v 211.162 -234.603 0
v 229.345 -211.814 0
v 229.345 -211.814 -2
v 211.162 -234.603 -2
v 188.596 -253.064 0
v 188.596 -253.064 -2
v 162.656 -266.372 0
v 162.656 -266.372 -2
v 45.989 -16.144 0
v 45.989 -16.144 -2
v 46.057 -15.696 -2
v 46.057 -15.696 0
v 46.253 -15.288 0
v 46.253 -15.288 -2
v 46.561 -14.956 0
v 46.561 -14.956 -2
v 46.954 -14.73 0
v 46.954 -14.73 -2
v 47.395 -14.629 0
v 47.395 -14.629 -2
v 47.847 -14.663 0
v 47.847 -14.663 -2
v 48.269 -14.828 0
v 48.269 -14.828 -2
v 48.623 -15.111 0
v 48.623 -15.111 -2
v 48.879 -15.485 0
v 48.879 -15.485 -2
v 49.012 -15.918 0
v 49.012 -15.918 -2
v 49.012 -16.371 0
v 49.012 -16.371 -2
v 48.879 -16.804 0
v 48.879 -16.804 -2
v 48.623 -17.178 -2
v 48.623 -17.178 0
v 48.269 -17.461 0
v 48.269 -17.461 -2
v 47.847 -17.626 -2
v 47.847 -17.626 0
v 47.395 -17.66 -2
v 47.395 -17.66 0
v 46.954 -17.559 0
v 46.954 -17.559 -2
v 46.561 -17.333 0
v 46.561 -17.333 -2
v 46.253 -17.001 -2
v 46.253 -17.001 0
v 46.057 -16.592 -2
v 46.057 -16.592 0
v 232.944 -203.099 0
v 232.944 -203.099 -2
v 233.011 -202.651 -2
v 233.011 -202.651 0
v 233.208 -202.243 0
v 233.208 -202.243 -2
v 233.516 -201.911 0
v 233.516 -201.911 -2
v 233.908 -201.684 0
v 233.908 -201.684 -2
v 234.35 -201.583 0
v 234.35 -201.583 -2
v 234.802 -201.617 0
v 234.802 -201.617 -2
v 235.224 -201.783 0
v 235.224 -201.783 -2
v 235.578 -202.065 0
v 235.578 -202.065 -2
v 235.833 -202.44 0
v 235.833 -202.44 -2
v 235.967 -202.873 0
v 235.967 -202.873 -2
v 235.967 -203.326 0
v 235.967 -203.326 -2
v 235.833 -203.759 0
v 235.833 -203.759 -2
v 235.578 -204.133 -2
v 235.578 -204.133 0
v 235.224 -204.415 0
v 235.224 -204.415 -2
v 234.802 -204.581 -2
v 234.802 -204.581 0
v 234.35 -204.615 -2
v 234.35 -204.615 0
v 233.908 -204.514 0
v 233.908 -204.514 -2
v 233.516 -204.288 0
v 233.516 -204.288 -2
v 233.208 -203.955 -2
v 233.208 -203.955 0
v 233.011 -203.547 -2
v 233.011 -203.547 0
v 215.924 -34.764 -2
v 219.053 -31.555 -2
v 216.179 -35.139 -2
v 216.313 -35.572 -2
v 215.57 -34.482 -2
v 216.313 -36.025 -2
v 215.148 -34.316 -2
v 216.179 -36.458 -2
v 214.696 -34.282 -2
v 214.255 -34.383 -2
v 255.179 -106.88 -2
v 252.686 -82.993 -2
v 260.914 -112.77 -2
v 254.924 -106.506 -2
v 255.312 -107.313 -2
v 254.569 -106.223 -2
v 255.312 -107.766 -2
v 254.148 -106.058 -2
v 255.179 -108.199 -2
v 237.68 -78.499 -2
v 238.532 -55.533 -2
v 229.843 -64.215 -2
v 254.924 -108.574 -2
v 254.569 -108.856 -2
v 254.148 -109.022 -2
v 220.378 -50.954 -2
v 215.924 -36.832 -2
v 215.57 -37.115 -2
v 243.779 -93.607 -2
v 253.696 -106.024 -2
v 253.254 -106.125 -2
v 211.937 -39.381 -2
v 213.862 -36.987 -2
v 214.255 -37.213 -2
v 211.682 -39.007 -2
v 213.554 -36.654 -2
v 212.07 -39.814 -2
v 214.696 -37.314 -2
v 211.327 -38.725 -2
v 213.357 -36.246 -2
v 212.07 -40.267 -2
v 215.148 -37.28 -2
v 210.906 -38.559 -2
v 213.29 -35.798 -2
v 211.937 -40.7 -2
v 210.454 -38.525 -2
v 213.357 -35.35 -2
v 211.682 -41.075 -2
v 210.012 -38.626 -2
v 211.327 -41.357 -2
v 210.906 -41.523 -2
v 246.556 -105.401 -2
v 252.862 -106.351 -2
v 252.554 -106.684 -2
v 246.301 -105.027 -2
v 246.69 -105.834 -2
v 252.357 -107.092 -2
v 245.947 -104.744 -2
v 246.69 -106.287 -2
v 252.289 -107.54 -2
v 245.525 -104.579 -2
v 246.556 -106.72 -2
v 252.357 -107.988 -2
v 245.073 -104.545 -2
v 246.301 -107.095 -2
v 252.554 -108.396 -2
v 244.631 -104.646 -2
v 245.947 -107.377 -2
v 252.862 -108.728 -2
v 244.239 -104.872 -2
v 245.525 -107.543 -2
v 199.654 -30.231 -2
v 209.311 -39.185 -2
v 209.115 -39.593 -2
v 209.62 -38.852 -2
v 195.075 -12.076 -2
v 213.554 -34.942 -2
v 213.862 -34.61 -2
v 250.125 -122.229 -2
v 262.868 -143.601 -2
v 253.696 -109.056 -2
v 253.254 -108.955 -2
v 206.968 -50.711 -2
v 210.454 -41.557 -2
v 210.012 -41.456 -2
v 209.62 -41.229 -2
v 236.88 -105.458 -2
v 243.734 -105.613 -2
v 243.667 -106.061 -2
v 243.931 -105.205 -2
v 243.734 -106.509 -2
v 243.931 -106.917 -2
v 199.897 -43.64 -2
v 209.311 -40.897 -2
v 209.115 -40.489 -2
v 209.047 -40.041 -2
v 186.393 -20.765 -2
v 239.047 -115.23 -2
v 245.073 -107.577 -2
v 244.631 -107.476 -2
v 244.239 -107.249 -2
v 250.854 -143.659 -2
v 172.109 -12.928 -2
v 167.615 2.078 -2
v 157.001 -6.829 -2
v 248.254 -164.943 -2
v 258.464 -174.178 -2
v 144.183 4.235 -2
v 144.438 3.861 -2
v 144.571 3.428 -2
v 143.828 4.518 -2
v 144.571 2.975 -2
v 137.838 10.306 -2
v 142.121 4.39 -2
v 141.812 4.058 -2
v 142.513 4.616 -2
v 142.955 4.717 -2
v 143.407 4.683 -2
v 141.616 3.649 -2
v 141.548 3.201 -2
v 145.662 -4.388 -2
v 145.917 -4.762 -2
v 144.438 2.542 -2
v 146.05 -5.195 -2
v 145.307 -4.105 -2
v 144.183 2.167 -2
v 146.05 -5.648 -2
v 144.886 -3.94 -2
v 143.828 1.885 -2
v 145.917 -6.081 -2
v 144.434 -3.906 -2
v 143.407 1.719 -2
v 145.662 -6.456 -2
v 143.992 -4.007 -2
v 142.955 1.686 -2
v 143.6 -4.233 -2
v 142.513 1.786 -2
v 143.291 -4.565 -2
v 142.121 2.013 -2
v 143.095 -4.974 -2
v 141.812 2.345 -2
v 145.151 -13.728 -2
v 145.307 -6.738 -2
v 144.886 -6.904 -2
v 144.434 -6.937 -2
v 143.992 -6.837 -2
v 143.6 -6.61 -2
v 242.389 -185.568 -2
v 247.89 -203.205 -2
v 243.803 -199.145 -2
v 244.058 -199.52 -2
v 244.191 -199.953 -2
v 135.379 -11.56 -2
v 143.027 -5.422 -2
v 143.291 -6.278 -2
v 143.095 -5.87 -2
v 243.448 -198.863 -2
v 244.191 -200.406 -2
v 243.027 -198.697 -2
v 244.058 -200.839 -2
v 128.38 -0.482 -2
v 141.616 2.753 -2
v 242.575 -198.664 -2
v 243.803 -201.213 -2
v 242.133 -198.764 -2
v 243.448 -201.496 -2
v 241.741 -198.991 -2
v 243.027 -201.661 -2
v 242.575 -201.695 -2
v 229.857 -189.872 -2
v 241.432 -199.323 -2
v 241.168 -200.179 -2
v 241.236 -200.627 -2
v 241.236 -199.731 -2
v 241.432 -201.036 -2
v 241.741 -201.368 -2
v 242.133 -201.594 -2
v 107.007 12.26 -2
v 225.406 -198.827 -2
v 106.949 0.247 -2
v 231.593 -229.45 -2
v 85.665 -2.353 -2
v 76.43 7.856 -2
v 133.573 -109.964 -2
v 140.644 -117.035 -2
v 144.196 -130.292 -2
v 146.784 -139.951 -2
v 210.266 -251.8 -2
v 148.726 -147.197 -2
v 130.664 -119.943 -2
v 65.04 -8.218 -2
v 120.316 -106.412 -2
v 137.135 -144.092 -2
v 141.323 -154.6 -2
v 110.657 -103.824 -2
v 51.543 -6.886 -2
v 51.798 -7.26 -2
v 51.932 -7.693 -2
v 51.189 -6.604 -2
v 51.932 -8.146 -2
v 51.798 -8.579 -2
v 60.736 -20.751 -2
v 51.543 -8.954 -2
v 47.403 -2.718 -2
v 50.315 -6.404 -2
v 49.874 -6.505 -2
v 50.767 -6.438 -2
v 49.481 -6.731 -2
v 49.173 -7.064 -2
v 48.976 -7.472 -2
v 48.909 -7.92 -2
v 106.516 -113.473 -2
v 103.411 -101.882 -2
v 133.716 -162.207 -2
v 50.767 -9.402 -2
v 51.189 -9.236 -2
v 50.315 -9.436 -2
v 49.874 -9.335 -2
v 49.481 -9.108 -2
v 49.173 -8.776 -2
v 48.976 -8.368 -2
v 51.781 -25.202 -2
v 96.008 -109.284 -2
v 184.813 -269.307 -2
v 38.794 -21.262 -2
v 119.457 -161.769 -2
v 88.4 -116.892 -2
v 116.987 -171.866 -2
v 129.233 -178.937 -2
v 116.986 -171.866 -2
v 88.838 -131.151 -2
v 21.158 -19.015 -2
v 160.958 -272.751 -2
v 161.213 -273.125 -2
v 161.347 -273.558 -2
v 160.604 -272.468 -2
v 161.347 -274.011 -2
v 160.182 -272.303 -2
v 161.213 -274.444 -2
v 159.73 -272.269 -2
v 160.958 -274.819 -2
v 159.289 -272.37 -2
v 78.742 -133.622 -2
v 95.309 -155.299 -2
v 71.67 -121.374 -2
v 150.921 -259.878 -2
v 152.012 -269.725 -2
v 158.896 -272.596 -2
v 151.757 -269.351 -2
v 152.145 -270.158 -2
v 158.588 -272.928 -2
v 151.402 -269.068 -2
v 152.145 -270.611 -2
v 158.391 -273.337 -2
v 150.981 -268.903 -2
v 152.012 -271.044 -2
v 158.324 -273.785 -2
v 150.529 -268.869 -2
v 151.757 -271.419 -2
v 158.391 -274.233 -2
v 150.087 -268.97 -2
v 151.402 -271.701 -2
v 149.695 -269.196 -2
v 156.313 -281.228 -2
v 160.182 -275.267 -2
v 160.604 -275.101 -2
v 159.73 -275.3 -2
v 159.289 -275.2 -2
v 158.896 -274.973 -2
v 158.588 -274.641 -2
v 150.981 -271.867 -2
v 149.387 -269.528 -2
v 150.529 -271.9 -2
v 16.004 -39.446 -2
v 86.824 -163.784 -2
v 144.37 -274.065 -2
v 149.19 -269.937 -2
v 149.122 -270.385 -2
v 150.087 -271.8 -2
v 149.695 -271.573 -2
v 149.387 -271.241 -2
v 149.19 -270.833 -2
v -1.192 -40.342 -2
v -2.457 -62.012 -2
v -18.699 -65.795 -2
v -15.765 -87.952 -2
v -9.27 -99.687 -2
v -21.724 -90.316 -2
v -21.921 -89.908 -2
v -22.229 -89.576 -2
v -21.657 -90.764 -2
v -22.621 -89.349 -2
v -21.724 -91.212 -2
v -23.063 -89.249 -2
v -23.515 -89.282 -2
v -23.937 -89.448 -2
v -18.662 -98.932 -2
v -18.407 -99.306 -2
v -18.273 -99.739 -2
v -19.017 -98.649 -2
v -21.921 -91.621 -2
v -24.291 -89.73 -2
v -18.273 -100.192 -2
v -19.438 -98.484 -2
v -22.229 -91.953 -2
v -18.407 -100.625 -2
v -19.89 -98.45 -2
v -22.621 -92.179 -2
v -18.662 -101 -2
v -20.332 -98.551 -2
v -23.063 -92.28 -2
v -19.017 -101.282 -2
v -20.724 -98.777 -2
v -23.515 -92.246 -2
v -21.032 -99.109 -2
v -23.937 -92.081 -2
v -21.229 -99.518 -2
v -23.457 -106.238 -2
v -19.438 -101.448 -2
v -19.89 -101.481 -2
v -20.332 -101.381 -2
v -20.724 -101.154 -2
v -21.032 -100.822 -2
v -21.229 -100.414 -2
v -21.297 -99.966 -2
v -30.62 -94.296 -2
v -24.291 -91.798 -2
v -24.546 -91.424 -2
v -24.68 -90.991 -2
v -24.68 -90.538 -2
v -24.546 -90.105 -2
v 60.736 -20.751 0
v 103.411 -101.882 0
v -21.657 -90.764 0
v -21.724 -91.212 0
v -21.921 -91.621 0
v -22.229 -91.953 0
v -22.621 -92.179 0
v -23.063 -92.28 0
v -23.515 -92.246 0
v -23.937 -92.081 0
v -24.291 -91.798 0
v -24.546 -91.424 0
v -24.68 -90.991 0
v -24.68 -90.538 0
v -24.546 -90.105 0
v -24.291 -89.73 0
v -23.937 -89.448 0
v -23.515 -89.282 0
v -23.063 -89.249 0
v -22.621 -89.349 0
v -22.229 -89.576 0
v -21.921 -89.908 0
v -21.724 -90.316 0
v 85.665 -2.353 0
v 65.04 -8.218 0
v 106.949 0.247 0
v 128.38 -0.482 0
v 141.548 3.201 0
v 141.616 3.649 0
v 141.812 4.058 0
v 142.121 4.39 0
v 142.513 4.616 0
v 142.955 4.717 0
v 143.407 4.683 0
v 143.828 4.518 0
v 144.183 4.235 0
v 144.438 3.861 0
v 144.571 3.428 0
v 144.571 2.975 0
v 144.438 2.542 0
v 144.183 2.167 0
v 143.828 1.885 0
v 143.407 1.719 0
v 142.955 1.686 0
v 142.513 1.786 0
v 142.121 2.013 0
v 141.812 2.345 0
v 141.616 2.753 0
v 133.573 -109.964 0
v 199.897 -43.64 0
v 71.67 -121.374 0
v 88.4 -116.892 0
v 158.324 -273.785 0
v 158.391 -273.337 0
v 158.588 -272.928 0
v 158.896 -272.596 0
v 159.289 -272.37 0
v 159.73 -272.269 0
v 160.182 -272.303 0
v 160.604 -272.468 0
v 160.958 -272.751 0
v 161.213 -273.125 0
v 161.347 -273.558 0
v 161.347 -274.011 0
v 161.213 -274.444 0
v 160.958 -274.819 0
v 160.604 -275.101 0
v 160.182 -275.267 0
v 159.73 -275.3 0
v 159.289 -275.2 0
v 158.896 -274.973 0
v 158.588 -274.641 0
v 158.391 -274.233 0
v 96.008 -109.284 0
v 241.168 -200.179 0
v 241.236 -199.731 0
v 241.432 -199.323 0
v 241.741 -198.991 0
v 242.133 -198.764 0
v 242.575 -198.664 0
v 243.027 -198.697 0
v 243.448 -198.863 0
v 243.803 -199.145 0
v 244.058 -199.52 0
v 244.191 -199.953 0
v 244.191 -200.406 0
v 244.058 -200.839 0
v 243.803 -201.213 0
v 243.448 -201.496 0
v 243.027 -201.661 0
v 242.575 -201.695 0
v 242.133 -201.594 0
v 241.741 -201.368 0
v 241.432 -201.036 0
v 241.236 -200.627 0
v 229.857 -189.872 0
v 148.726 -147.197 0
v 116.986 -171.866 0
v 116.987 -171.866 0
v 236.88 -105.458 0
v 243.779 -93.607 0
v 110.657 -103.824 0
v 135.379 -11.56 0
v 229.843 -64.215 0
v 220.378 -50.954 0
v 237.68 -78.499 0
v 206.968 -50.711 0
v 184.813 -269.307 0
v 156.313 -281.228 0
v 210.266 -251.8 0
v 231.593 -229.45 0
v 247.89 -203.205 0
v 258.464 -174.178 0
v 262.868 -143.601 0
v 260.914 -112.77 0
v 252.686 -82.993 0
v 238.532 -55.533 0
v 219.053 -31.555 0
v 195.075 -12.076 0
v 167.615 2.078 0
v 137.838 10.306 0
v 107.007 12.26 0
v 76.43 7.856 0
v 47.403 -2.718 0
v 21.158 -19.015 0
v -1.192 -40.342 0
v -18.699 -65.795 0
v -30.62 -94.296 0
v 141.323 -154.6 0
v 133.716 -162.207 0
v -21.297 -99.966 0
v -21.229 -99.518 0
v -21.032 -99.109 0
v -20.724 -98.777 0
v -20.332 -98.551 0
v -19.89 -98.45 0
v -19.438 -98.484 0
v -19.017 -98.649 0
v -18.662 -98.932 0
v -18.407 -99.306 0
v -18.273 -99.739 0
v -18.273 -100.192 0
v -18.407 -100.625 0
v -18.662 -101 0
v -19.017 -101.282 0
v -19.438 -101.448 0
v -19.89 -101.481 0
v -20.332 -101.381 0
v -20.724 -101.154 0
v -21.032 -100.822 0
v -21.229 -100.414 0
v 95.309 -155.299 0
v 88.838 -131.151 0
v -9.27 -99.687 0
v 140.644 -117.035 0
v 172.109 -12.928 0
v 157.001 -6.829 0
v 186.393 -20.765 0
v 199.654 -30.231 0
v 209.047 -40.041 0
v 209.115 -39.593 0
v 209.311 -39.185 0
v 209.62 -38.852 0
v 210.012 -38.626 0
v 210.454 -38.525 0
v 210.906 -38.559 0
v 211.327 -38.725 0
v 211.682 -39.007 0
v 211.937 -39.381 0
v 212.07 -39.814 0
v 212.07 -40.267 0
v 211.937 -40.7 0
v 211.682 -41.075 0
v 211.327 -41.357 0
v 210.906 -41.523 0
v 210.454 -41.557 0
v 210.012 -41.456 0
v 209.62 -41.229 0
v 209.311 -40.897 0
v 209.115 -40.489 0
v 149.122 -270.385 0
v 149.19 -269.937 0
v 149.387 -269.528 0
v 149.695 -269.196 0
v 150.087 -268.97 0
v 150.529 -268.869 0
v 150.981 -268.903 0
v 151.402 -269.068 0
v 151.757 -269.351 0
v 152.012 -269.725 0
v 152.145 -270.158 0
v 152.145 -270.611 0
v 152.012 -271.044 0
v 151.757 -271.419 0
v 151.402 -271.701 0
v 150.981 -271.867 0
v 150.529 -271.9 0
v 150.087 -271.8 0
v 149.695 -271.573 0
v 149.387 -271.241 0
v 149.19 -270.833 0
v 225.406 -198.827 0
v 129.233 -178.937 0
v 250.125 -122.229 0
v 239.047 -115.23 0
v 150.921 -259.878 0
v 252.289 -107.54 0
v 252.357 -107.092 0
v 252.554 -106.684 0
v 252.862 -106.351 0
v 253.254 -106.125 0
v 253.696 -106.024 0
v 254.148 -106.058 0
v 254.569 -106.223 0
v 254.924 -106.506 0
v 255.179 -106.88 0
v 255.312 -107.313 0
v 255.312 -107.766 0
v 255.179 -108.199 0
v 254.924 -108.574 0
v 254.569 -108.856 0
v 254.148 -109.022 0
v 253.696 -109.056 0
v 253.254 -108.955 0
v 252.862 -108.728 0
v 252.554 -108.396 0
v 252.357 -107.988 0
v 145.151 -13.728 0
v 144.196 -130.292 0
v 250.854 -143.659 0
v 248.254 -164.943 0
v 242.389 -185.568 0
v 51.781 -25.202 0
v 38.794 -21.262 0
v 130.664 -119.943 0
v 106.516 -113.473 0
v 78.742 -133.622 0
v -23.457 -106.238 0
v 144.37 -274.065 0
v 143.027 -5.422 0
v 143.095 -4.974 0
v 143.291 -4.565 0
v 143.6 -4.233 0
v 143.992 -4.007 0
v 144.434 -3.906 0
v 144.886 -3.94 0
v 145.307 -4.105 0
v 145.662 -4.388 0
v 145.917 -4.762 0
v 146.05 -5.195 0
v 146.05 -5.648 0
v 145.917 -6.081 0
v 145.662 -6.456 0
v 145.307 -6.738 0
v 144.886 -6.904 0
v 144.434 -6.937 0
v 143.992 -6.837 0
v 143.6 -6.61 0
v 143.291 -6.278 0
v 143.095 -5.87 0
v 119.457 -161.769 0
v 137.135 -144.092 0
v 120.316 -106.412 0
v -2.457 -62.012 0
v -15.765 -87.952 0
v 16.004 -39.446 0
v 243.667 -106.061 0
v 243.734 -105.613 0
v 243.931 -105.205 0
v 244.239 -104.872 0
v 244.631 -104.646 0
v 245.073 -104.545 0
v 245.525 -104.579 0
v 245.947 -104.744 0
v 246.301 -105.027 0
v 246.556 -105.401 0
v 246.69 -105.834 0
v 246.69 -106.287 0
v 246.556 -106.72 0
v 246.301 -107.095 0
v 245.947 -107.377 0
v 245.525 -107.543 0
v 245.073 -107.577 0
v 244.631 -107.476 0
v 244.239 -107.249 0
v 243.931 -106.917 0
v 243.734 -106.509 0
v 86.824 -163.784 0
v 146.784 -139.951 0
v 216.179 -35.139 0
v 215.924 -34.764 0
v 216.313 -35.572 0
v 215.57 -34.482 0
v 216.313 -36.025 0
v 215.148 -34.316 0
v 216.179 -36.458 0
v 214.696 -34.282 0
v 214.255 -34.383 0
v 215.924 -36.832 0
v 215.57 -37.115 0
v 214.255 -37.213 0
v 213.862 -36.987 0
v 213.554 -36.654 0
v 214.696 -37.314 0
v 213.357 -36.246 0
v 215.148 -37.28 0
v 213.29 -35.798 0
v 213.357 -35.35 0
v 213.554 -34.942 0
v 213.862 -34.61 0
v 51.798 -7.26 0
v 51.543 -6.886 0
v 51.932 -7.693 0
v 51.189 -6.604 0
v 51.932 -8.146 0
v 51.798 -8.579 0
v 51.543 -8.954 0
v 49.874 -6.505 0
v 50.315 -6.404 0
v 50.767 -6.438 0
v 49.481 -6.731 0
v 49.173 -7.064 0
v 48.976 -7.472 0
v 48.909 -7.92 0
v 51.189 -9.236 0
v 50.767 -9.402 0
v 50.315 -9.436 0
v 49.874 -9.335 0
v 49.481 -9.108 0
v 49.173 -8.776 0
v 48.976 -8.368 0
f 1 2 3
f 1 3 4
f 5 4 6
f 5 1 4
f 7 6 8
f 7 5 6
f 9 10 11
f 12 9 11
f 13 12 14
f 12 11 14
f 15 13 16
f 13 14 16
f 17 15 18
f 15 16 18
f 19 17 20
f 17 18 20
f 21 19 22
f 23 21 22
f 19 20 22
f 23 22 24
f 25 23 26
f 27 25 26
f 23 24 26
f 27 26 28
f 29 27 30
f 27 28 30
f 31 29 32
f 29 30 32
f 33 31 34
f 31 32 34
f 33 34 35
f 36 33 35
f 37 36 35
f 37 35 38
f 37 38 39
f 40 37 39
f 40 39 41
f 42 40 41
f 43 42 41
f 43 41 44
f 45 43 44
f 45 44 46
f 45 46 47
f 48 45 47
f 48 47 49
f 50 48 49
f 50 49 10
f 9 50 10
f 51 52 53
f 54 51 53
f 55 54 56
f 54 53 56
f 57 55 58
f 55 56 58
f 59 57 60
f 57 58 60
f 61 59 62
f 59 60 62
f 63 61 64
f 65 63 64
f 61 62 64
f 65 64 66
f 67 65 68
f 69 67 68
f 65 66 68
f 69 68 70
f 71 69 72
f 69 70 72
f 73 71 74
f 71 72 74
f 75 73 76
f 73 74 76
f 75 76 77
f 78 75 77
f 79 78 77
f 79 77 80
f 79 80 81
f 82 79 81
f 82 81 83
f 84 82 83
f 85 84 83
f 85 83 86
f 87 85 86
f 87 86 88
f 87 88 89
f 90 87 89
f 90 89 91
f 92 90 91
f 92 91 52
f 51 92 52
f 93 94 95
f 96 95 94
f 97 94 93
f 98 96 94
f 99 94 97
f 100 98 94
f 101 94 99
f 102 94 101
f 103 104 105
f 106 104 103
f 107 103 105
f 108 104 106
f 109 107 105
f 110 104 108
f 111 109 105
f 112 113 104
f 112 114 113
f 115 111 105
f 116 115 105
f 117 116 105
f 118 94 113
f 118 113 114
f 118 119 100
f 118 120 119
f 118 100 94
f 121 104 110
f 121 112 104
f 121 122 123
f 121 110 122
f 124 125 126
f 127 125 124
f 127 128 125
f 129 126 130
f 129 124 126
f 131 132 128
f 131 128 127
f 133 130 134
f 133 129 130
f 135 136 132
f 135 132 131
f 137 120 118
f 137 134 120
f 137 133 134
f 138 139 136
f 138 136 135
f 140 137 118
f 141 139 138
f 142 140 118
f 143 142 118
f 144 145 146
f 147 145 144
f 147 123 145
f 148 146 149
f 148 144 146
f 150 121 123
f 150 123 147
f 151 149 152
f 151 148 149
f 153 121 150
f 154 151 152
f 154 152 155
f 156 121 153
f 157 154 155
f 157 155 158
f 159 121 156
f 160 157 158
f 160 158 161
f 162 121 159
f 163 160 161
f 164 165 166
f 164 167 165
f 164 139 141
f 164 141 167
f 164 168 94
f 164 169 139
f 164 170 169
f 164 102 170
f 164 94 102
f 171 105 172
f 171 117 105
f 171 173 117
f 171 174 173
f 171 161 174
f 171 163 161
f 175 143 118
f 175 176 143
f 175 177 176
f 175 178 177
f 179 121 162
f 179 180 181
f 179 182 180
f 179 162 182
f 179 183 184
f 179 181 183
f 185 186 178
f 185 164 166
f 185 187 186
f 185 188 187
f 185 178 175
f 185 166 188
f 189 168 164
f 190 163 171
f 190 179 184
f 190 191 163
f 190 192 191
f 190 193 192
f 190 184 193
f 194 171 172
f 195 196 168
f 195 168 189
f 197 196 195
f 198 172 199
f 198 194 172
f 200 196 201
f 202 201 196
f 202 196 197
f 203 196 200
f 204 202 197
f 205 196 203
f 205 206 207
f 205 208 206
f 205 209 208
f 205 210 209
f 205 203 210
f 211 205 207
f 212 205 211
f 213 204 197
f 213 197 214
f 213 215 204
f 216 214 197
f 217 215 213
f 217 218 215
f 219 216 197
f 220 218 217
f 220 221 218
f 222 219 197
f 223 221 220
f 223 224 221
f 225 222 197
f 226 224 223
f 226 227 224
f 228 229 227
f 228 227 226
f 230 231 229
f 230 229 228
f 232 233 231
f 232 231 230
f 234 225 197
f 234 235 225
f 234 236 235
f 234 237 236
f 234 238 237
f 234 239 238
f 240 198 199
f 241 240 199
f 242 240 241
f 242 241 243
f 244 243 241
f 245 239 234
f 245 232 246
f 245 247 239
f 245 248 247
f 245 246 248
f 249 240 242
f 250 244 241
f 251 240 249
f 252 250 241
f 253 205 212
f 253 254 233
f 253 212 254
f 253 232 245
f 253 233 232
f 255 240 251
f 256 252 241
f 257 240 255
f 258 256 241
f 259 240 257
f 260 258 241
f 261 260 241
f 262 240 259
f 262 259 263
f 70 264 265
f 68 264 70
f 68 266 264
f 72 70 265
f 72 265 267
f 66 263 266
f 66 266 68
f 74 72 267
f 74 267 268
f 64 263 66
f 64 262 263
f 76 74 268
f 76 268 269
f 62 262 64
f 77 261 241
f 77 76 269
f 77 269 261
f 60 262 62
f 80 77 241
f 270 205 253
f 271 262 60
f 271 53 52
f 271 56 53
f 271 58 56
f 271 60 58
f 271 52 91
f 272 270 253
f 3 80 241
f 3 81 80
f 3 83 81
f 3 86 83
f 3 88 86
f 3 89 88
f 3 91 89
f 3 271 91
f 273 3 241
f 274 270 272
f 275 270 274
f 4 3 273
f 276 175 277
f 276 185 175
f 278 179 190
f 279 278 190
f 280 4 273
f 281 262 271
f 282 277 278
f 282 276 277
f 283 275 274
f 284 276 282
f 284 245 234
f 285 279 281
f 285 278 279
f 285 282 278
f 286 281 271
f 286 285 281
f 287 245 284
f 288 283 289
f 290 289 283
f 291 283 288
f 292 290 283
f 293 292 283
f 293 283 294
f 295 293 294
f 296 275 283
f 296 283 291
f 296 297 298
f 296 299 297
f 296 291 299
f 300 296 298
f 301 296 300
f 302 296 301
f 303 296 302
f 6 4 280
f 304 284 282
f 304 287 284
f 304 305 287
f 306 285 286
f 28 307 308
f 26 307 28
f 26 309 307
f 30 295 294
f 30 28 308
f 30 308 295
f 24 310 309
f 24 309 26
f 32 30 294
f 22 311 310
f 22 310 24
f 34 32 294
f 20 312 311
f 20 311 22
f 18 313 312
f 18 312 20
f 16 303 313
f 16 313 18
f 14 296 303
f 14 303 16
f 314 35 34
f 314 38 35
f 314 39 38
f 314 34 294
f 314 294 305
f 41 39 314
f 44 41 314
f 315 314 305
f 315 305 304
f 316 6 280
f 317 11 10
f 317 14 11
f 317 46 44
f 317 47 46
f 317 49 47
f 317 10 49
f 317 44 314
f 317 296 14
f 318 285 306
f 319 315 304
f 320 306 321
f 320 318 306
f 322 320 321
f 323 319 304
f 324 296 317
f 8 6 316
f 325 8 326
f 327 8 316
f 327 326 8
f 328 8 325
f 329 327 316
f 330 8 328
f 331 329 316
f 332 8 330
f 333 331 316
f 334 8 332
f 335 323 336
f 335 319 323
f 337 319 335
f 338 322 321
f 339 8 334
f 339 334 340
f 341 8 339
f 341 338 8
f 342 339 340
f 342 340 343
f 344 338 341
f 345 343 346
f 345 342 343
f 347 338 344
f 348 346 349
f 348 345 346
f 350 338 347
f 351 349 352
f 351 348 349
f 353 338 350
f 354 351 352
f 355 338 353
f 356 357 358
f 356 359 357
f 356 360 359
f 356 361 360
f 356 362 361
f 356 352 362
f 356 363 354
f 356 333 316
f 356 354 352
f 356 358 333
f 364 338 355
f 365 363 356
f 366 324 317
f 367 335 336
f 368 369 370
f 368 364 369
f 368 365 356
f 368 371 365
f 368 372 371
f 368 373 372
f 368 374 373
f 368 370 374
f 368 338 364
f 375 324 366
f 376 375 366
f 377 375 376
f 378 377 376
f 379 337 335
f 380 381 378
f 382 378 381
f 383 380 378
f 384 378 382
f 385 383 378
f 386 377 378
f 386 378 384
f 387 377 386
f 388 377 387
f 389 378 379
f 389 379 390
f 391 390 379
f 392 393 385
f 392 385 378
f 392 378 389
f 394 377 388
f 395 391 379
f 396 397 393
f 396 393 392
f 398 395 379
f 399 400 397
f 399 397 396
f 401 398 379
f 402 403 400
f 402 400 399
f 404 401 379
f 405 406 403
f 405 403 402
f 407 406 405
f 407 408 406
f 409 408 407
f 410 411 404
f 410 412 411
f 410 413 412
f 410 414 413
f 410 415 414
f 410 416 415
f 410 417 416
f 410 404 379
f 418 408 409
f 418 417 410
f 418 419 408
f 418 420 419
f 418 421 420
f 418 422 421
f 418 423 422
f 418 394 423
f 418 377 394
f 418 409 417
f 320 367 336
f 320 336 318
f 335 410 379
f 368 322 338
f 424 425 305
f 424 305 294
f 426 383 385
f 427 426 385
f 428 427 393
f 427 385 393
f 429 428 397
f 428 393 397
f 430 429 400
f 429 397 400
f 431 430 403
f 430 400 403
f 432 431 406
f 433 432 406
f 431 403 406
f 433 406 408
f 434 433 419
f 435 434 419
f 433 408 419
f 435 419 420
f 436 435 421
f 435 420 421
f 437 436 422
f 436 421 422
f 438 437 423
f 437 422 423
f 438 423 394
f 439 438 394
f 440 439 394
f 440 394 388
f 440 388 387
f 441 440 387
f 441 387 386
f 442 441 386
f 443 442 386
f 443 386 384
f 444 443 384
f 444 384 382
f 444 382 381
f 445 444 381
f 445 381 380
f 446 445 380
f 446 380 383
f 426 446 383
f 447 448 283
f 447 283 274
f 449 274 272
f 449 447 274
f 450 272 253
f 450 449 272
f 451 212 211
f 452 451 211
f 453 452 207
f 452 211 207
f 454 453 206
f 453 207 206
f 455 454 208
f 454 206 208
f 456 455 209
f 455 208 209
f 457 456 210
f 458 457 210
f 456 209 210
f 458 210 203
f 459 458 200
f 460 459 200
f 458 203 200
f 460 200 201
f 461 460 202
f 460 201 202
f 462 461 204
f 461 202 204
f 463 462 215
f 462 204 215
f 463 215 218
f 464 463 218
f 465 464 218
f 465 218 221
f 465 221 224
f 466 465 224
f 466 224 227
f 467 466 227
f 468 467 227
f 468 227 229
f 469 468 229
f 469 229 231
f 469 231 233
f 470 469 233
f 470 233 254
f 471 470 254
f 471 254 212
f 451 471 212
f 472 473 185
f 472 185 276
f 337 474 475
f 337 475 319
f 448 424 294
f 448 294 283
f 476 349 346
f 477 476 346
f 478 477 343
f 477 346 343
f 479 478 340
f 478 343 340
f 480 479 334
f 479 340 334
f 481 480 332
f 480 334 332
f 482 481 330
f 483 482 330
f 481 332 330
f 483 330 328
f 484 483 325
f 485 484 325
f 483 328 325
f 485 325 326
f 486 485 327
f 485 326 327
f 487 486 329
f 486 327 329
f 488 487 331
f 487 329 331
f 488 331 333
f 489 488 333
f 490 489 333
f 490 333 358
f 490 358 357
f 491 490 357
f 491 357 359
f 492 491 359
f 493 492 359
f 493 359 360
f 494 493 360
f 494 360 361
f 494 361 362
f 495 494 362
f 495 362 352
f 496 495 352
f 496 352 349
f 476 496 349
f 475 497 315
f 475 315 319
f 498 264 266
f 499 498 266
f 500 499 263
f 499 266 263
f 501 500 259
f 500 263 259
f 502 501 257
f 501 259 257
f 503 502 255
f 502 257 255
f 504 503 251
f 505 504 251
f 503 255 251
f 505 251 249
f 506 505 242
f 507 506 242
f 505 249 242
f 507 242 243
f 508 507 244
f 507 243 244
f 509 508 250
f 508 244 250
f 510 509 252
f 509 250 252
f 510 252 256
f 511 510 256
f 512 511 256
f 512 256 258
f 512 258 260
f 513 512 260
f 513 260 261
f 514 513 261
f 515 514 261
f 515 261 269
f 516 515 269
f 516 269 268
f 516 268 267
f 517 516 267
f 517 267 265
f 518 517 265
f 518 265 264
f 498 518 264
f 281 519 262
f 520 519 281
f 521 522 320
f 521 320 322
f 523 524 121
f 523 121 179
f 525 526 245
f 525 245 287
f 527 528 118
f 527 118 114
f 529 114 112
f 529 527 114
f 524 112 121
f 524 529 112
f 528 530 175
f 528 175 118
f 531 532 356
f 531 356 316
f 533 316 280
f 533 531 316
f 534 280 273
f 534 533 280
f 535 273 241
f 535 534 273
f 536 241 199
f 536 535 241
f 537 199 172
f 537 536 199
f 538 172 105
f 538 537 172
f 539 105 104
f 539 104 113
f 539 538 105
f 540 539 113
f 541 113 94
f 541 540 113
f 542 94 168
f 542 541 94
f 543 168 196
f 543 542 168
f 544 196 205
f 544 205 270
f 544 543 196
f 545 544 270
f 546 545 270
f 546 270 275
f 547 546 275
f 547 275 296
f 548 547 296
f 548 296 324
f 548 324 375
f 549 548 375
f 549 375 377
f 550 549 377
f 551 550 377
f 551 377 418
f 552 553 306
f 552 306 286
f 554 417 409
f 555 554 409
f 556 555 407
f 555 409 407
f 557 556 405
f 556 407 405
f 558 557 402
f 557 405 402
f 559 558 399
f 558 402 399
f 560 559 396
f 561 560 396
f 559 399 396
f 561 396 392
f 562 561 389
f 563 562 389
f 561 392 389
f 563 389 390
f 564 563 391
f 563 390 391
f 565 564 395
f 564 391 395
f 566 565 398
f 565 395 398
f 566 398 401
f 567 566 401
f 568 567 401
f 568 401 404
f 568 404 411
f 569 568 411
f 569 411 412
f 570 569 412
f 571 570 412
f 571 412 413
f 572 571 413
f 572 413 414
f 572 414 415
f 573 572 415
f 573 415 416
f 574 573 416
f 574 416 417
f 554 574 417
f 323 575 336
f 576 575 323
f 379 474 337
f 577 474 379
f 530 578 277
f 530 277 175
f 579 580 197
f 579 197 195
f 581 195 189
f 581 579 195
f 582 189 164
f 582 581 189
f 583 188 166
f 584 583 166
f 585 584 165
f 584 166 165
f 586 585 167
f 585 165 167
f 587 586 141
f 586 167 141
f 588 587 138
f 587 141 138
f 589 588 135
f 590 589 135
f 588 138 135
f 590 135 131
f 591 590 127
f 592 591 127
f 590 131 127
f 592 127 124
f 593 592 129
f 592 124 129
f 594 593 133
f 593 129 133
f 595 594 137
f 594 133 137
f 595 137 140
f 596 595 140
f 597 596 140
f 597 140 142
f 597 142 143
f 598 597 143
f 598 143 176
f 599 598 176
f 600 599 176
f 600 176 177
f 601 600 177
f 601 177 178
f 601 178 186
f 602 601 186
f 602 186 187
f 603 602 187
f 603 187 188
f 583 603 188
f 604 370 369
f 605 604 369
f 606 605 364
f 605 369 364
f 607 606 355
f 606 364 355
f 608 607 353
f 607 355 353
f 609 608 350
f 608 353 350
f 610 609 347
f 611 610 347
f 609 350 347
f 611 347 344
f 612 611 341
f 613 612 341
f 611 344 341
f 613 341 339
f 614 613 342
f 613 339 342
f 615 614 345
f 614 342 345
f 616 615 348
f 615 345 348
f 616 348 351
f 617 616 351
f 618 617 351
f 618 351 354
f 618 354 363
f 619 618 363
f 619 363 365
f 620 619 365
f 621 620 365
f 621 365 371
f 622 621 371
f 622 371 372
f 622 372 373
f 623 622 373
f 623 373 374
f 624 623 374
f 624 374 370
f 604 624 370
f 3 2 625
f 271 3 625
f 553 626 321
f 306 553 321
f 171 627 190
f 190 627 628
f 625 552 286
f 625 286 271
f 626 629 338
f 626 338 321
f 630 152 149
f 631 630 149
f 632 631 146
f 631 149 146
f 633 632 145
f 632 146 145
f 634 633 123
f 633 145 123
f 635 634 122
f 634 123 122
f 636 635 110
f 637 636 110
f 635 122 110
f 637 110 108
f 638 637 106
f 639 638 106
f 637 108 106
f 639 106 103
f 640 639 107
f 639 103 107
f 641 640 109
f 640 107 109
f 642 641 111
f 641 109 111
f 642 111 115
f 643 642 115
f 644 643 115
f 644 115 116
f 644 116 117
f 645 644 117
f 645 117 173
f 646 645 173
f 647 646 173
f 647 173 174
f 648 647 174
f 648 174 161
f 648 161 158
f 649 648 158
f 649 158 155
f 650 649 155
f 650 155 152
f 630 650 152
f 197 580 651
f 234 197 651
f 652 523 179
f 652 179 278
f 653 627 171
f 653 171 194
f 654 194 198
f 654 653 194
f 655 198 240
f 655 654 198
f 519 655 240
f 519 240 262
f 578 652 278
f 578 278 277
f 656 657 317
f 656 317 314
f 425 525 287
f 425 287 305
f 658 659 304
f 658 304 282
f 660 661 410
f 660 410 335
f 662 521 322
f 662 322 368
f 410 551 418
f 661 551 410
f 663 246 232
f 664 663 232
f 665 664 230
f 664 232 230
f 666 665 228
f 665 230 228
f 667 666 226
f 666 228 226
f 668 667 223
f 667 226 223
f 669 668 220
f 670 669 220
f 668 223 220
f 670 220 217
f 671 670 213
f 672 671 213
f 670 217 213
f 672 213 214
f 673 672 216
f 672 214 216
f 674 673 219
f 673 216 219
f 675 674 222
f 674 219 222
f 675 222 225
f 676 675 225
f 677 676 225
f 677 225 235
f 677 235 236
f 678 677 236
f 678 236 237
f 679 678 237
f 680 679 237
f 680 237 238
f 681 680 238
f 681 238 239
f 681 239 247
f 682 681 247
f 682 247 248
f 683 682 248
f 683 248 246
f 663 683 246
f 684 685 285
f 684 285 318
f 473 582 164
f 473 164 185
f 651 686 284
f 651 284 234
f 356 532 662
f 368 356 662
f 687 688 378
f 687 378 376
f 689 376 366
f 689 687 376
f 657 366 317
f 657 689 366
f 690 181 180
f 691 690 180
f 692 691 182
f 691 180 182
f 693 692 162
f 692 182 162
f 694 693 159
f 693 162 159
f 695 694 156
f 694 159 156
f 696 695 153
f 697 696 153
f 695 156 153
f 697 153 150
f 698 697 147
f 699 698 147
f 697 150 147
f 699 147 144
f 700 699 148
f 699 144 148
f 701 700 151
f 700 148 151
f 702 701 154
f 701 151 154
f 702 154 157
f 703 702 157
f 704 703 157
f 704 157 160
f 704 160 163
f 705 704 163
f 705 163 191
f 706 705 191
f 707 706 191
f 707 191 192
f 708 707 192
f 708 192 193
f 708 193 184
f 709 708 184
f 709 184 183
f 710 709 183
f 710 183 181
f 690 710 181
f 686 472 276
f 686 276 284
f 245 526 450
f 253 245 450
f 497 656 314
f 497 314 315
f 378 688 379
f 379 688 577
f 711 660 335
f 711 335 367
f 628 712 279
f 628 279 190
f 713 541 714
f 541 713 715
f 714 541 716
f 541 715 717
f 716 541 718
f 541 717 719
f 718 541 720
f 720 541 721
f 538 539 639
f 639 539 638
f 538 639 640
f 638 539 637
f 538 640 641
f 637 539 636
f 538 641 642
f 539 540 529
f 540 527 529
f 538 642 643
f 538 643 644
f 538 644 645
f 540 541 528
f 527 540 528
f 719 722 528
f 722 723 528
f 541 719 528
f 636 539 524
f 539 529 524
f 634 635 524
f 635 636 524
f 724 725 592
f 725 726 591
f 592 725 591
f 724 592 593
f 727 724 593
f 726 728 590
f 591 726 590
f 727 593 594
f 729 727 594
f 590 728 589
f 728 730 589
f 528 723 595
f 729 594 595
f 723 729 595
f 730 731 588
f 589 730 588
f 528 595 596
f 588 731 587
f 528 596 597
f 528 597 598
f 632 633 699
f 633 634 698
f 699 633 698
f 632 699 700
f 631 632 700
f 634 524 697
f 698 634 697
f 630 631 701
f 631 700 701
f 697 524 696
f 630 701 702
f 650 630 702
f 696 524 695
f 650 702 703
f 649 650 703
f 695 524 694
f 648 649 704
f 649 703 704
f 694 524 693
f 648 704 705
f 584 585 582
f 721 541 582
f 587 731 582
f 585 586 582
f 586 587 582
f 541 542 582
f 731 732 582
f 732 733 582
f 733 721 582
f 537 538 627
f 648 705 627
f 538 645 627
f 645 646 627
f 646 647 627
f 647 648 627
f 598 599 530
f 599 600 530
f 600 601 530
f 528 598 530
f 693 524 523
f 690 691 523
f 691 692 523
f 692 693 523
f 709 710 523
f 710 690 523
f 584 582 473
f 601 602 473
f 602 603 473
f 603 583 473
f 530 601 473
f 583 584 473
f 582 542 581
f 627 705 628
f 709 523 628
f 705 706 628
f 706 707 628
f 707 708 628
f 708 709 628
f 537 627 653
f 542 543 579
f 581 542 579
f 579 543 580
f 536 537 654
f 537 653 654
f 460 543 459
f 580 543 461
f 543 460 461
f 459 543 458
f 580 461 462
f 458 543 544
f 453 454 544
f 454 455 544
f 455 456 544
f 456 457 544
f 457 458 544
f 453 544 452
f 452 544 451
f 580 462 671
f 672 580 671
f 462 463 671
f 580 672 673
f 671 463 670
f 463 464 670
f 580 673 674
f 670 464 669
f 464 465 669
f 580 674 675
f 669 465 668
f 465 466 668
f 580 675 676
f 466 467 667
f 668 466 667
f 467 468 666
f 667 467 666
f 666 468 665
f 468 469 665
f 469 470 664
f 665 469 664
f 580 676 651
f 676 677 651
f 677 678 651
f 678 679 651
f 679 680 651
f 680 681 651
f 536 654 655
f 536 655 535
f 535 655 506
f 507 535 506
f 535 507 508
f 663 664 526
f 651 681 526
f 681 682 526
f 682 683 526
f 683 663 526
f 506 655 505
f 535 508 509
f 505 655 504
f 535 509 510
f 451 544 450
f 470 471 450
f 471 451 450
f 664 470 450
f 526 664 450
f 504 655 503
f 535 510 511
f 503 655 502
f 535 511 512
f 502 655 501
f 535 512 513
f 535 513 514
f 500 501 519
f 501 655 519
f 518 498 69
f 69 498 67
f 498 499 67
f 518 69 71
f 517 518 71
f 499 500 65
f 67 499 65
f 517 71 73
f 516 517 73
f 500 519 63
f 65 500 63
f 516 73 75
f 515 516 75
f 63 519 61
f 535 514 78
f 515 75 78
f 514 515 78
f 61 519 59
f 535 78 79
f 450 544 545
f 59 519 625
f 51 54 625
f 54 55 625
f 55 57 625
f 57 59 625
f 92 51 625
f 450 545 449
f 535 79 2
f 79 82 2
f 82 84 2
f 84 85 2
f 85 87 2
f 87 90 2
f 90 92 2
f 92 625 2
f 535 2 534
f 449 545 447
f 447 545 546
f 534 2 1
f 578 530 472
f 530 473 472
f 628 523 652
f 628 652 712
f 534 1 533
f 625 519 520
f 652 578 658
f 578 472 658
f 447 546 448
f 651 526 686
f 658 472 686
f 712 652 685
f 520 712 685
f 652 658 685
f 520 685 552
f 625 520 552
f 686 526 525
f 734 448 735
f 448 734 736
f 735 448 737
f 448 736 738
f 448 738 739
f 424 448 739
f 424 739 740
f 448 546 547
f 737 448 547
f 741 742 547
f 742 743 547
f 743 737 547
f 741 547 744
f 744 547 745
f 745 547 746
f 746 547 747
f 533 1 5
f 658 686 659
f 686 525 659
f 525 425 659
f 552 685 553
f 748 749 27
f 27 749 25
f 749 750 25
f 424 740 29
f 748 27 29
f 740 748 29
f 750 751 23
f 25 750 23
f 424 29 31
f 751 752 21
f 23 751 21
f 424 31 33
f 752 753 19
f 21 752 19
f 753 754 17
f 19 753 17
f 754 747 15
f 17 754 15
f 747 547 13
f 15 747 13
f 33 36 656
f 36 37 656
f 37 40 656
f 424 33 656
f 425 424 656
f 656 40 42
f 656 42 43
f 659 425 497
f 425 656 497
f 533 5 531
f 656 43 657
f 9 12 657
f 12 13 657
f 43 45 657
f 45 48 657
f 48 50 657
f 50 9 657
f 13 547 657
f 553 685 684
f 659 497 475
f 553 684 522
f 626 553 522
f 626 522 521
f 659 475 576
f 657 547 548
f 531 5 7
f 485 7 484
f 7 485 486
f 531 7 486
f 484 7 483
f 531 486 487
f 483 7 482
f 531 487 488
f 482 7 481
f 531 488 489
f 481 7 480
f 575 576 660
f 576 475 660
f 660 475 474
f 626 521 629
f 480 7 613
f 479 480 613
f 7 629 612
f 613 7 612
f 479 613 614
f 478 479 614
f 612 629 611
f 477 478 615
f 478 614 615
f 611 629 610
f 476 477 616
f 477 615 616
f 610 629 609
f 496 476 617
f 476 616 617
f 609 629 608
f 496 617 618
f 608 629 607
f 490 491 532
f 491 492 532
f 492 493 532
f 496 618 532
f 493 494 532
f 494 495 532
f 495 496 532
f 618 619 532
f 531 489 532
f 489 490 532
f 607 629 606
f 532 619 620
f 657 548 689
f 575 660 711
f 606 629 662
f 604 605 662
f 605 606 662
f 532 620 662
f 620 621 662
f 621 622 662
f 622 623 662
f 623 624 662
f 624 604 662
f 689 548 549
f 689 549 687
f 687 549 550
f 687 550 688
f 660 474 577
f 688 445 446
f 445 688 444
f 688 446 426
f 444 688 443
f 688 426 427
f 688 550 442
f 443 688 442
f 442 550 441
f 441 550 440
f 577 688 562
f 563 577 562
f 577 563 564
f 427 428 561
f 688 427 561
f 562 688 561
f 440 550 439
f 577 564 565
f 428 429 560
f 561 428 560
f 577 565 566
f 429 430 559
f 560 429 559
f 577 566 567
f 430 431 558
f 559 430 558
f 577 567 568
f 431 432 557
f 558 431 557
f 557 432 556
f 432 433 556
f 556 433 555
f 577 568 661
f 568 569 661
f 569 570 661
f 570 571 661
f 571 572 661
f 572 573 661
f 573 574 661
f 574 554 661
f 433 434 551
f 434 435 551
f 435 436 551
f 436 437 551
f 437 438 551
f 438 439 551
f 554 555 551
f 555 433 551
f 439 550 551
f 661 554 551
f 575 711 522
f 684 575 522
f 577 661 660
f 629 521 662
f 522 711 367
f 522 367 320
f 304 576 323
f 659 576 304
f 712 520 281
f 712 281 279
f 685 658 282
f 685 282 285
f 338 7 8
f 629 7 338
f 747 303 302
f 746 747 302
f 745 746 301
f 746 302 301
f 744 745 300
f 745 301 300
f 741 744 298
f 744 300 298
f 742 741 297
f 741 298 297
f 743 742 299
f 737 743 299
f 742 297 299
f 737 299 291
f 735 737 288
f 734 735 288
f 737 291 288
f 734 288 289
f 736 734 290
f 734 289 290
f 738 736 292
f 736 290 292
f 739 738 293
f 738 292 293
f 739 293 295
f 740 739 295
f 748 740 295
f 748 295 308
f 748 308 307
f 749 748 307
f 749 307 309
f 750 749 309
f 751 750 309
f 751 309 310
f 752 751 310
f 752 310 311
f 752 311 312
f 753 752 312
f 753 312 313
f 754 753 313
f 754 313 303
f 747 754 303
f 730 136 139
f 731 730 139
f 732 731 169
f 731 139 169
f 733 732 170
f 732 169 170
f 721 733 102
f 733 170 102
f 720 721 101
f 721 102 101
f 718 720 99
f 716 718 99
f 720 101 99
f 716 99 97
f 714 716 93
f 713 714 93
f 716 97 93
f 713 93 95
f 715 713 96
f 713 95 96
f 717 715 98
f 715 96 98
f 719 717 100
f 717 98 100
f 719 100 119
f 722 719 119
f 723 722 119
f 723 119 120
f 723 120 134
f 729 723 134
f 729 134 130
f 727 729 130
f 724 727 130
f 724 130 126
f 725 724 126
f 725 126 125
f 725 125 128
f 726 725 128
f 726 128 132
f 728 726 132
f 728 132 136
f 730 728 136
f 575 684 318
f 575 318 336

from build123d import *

# Parameters (mm, degrees)
EXTRUDE_11_DEPTH    = 2
CHAMFER_1_SIZE      = 10
CHAMFER_3_SIZE      = 10
SKETCH_4_R          = 1.52
CUT_EXTRUDE_1_DEPTH = 10


with BuildPart() as part:
    # 草图2 → 凸台-拉伸11 (new body)
    with BuildSketch(Plane.XY):
        with BuildLine():
            Line((116.986968716, -171.866279839), (116.986166566, -171.866494817))
            Line((116.986166566, -171.866494817), (146.957834859, -283.724244016))
            ThreePointArc((146.95783486, -283.724244021), (219.052953151, -31.555197901), (-33.116092969, -103.650316192))
            Line((-33.116092963, -103.650316193), (78.741656236, -133.621984487))
            Line((78.741656247, -133.621984484), (86.823548141, -163.784015655))
            Line((86.823548141, -163.784015655), (86.824011296, -163.784139757))
            Line((86.824011296, -163.784139757), (116.986968716, -171.866279839))
        make_face()
        Polygon((119.456975173, -161.769210408), (95.30929267, -155.298858383), (95.308829516, -155.298734281), (88.838353388, -131.150588624), (106.516022918, -113.472919094), (130.664168575, -119.943395221), (137.134644703, -144.091540879), align=None, mode=Mode.SUBTRACT)
        with BuildLine():
            Line((126.645296946, -169.277827092), (141.323054558, -154.60006948))
            Line((141.323054558, -154.60006948), (234.255998853, -203.48188474))
            ThreePointArc((234.255998853, -203.48188474), (200.365014055, -244.433677808), (153.509224986, -269.537128502))
            Line((153.509224986, -269.537128502), (126.645296946, -169.277827092))
        make_face(mode=Mode.SUBTRACT)
        with BuildLine():
            ThreePointArc((248.706632523, -112.641381763), (249.968706378, -154.348708565), (238.707168991, -194.526708951))
            Line((238.707168991, -194.526708951), (148.725754618, -147.19736942))
            Line((148.725754618, -147.19736942), (146.784206577, -139.951413486))
            Line((146.784206577, -139.951413486), (248.706632523, -112.641381763))
        make_face(mode=Mode.SUBTRACT)
        with BuildLine():
            ThreePointArc((-18.929686723, -97.098736021), (6.17383244, -50.2426152), (47.125895572, -16.351447355))
            Line((47.125895572, -16.351447355), (96.007676733, -109.284326822))
            Line((96.007676733, -109.284326822), (81.329397649, -123.962605906))
            Line((81.329397649, -123.962605906), (-18.929686723, -97.098736021))
        make_face(mode=Mode.SUBTRACT)
        with BuildLine():
            ThreePointArc((56.081079681, -11.900293037), (96.259335826, -0.638798731), (137.966891648, -1.901061882))
            Line((137.966891648, -1.901061882), (110.656845042, -103.823543372))
            Line((110.656845042, -103.823543372), (103.410518411, -101.881896003))
            Line((103.410518411, -101.881896003), (56.081079681, -11.900293037))
        make_face(mode=Mode.SUBTRACT)
        with BuildLine():
            ThreePointArc((147.738817906, -4.068769649), (179.372913634, -16.638491001), (206.967778767, -36.569304474))
            Line((206.967778767, -36.569304474), (133.573137745, -109.963945495))
            Line((133.573137745, -109.963945495), (120.316103305, -106.411733823))
            Line((120.316103305, -106.411733823), (147.738817906, -4.068769649))
        make_face(mode=Mode.SUBTRACT)
        with BuildLine():
            ThreePointArc((214.038825287, -43.640393577), (233.969445691, -71.235329731), (246.538975276, -102.869441968))
            Line((246.538975276, -102.869441968), (144.196016126, -130.292155223))
            Line((144.196016126, -130.292155223), (140.643866505, -117.03535236))
            Line((140.643866505, -117.03535236), (214.038825287, -43.640393577))
        make_face(mode=Mode.SUBTRACT)
    extrude(amount=-EXTRUDE_11_DEPTH)

    # 倒角1
    # the kernel refuses this chamfer: 10 mm, written as the material it adds along each edge
    with BuildSketch(Plane(origin=(246.538975276, -102.869441968, 0), x_dir=(-0.28555901452107074, 0.9583611267292487, 0), z_dir=(0, 0, -1))) as chamfer_1_piece_1:
        with BuildLine():
            Line((9.665018265, 0), (CHAMFER_1_SIZE * 0.0277867153721, -CHAMFER_1_SIZE * 0.999613874678))
            Line((CHAMFER_1_SIZE * 0.0277867153721, -CHAMFER_1_SIZE * 0.999613874678), (0, 0))
            ThreePointArc((0, 0), (4.969359021, 0.084571078), (9.665018265, 0))
        make_face()
    extrude(amount=2)
    with BuildSketch(Plane(origin=(214.038825287, -43.640393577, 0), x_dir=(-0.707106781186561, -0.707106781186534, 0), z_dir=(0, 0, -1))) as chamfer_1_piece_2:
        with BuildLine():
            Line((CHAMFER_1_SIZE, 0), (0.689672032, -9.65402706))
            ThreePointArc((0.689672032, -9.65402706), (0.269761539, -4.966357207), (0, 0))
            Line((0, 0), (CHAMFER_1_SIZE, 0))
        make_face()
    extrude(amount=2)
    with BuildSketch(Plane(origin=(238.707168991, -194.526708951, 0), x_dir=(0.38013608783902403, 0.9249305675143631, 0), z_dir=(0, 0, -1))) as chamfer_1_piece_3:
        with BuildLine():
            Line((9.685612303, 0), (CHAMFER_1_SIZE * 0.0941398773056, -CHAMFER_1_SIZE * 0.995558980423))
            Line((CHAMFER_1_SIZE * 0.0941398773056, -CHAMFER_1_SIZE * 0.995558980423), (0, 0))
            ThreePointArc((0, 0), (4.974727114, 0.084937068), (9.685612303, 0))
        make_face()
    extrude(amount=2)
    with BuildSketch(Plane(origin=(248.706632523, -112.641381763, 0), x_dir=(0.14636574749919642, -0.9892305433815727, 0), z_dir=(0, 0, -1))) as chamfer_1_piece_4:
        with BuildLine():
            Line((9.691773178, 0), (CHAMFER_1_SIZE * 0.114653249031, CHAMFER_1_SIZE * 0.99340557301))
            Line((CHAMFER_1_SIZE * 0.114653249031, CHAMFER_1_SIZE * 0.99340557301), (0, 0))
            ThreePointArc((0, 0), (4.976248684, -0.085046752), (9.691773178, 0))
        make_face()
    extrude(amount=2)
    with BuildSketch(Plane(origin=(206.967778767, -36.569304474, 0), x_dir=(-0.7556917941479319, 0.6549274099146253, 0), z_dir=(0, 0, -1))) as chamfer_1_piece_5:
        with BuildLine():
            Line((9.678628526, 0), (CHAMFER_1_SIZE * 0.0712511793936, -CHAMFER_1_SIZE * 0.997458404865))
            Line((CHAMFER_1_SIZE * 0.0712511793936, -CHAMFER_1_SIZE * 0.997458404865), (0, 0))
            ThreePointArc((0, 0), (4.972954578, 0.084812842), (9.678628526, 0))
        make_face()
    extrude(amount=2)
    with BuildSketch(Plane(origin=(147.738817906, -4.068769649, 0), x_dir=(0.9583596366559947, -0.28556401529007475, 0), z_dir=(0, 0, -1))) as chamfer_1_piece_6:
        with BuildLine():
            Line((9.665019928, 0), (CHAMFER_1_SIZE * 0.0277919314036, CHAMFER_1_SIZE * 0.999613729672))
            Line((CHAMFER_1_SIZE * 0.0277919314036, CHAMFER_1_SIZE * 0.999613729672), (0, 0))
            ThreePointArc((0, 0), (4.969359471, -0.084571108), (9.665019928, 0))
        make_face()
    extrude(amount=2)
    with BuildSketch(Plane(origin=(153.509224986, -269.537128502, 0), x_dir=(0.9450297338640432, 0.32698440652859245, 0), z_dir=(0, 0, -1))) as chamfer_1_piece_7:
        with BuildLine():
            Line((9.678629813, 0), (CHAMFER_1_SIZE * 0.071255359942, -CHAMFER_1_SIZE * 0.997458106228))
            Line((CHAMFER_1_SIZE * 0.071255359942, -CHAMFER_1_SIZE * 0.997458106228), (0, 0))
            ThreePointArc((0, 0), (4.972954909, 0.084812865), (9.678629813, 0))
        make_face()
    extrude(amount=2)
    with BuildSketch(Plane(origin=(234.255998853, -203.48188474, 0), x_dir=(-0.5077534832780394, -0.861502408713416, 0), z_dir=(0, 0, -1))) as chamfer_1_piece_8:
        with BuildLine():
            Line((9.671511766, 0), (CHAMFER_1_SIZE * 0.0483333592427, CHAMFER_1_SIZE * 0.998831260216))
            Line((CHAMFER_1_SIZE * 0.0483333592427, CHAMFER_1_SIZE * 0.998831260216), (0, 0))
            ThreePointArc((0, 0), (4.97109735, -0.08468637), (9.671511766, 0))
        make_face()
    extrude(amount=2)
    with BuildSketch(Plane(origin=(-18.929686723, -97.098736021, 0), x_dir=(0.32698155779507593, 0.9450307195334474, 0), z_dir=(0, 0, -1))) as chamfer_1_piece_9:
        with BuildLine():
            Line((9.678628888, 0), (CHAMFER_1_SIZE * 0.0712523531674, CHAMFER_1_SIZE * 0.997458321018))
            Line((CHAMFER_1_SIZE * 0.0712523531674, CHAMFER_1_SIZE * 0.997458321018), (0, 0))
            ThreePointArc((0, 0), (4.972954671, -0.084812848), (9.678628888, 0))
        make_face()
    extrude(amount=2)
    with BuildSketch(Plane(origin=(47.125895572, -16.351447355, 0), x_dir=(-0.8615033162863328, -0.5077519434011564, 0), z_dir=(0, 0, -1))) as chamfer_1_piece_10:
        with BuildLine():
            Line((9.671511206, 0), (CHAMFER_1_SIZE * 0.0483315739005, -CHAMFER_1_SIZE * 0.998831346607))
            Line((CHAMFER_1_SIZE * 0.0483315739005, -CHAMFER_1_SIZE * 0.998831346607), (0, 0))
            ThreePointArc((0, 0), (4.971097202, 0.08468636), (9.671511206, 0))
        make_face()
    extrude(amount=2)
    with BuildSketch(Plane(origin=(56.081079681, -11.900293037, 0), x_dir=(0.46552074617297745, -0.8850369680880875, 0), z_dir=(0, 0, -1))) as chamfer_1_piece_11:
        with BuildLine():
            Line((CHAMFER_1_SIZE, 0), (0.911819668, -9.642597213))
            ThreePointArc((0.911819668, -9.642597213), (0.383769224, -4.960629667), (0, 0))
            Line((0, 0), (CHAMFER_1_SIZE, 0))
        make_face()
    extrude(amount=2)
    with BuildSketch(Plane(origin=(137.966891648, -1.901061882, 0), x_dir=(-0.258819045102493, -0.9659258262890758, 0), z_dir=(0, 0, -1))) as chamfer_1_piece_12:
        with BuildLine():
            Line((CHAMFER_1_SIZE, 0), (1.111142712, 9.627865763))
            ThreePointArc((1.111142712, 9.627865763), (0.486031221, 4.953186227), (0, 0))
            Line((0, 0), (CHAMFER_1_SIZE, 0))
        make_face()
    extrude(amount=2)
    # the kernel refuses this chamfer: 10 mm, written as the material it takes off along each edge
    with BuildSketch(Plane(origin=(146.95783486, -283.724244018, 25.728190053), x_dir=(0.9662009253756813, 0.25779017010579985, 0), z_dir=(0, 0, -1))) as chamfer_1_2_piece_1:
        with BuildLine():
            Line((9.681979791, 0), (-CHAMFER_1_SIZE * 0.00106063647762, -CHAMFER_1_SIZE * 0.999999437516))
            Line((-CHAMFER_1_SIZE * 0.00106063647762, -CHAMFER_1_SIZE * 0.999999437516), (0, 0))
            ThreePointArc((0, 0), (4.980125863, 0.078072968), (9.681979791, 0))
        make_face()
    extrude(amount=53.456380107, mode=Mode.SUBTRACT)
    with BuildSketch(Plane(origin=(-33.116092966, -103.650316193, 25.728190053), x_dir=(0.25779017010579297, 0.966200925375683, 0), z_dir=(0, 0, -1))) as chamfer_1_2_piece_2:
        with BuildLine():
            Line((9.681979791, 0), (-CHAMFER_1_SIZE * 0.00106063647762, CHAMFER_1_SIZE * 0.999999437516))
            Line((-CHAMFER_1_SIZE * 0.00106063647762, CHAMFER_1_SIZE * 0.999999437516), (0, 0))
            ThreePointArc((0, 0), (4.980125863, -0.078072968), (9.681979791, 0))
        make_face()
    extrude(amount=53.456380107, mode=Mode.SUBTRACT)

    # 倒角3
    chamfer_3_edges = [part.edges().sort_by_distance(p)[0] for p in [
        (126.645296946, -169.277827092, -1),
        (81.329397649, -123.962605906, -1),
    ]]
    chamfer(chamfer_3_edges, length=CHAMFER_3_SIZE)

    # 草图4 → 切除-拉伸1 (cut)
    with BuildSketch(Plane(origin=(0, 0, -2), x_dir=(-1, 0, 0), z_dir=(0, 0, -1))):
        with Locations((-245.186502849, -106.060815296)):
            Circle(SKETCH_4_R)
        with Locations((-253.809433195, -107.539796629)):
            Circle(SKETCH_4_R)
        with Locations((-234.46368438, -203.099121031)):
            Circle(SKETCH_4_R)
        with Locations((-242.688279646, -200.179263146)):
            Circle(SKETCH_4_R)
        with Locations((-150.64247259, -270.384667581)):
            Circle(SKETCH_4_R)
        with Locations((-159.843873975, -273.784707323)):
            Circle(SKETCH_4_R)
        with Locations((-210.567284016, -40.040867037)):
            Circle(SKETCH_4_R)
        with Locations((-214.809924703, -35.79822635)):
            Circle(SKETCH_4_R)
        with Locations((-144.547335756, -5.421648203)):
            Circle(SKETCH_4_R)
        with Locations((-143.068354423, 3.201282143)):
            Circle(SKETCH_4_R)
        with Locations((-47.509030022, -16.144466672)):
            Circle(SKETCH_4_R)
        with Locations((-50.428887906, -7.919871406)):
            Circle(SKETCH_4_R)
        with Locations((19.776516528, -99.965678463)):
            Circle(SKETCH_4_R)
        with Locations(Location((23.176556271, -90.764277077, 0), (0, 0, 180))):
            Circle(SKETCH_4_R)
    extrude(amount=-CUT_EXTRUDE_1_DEPTH, mode=Mode.SUBTRACT)


solid = part.part
